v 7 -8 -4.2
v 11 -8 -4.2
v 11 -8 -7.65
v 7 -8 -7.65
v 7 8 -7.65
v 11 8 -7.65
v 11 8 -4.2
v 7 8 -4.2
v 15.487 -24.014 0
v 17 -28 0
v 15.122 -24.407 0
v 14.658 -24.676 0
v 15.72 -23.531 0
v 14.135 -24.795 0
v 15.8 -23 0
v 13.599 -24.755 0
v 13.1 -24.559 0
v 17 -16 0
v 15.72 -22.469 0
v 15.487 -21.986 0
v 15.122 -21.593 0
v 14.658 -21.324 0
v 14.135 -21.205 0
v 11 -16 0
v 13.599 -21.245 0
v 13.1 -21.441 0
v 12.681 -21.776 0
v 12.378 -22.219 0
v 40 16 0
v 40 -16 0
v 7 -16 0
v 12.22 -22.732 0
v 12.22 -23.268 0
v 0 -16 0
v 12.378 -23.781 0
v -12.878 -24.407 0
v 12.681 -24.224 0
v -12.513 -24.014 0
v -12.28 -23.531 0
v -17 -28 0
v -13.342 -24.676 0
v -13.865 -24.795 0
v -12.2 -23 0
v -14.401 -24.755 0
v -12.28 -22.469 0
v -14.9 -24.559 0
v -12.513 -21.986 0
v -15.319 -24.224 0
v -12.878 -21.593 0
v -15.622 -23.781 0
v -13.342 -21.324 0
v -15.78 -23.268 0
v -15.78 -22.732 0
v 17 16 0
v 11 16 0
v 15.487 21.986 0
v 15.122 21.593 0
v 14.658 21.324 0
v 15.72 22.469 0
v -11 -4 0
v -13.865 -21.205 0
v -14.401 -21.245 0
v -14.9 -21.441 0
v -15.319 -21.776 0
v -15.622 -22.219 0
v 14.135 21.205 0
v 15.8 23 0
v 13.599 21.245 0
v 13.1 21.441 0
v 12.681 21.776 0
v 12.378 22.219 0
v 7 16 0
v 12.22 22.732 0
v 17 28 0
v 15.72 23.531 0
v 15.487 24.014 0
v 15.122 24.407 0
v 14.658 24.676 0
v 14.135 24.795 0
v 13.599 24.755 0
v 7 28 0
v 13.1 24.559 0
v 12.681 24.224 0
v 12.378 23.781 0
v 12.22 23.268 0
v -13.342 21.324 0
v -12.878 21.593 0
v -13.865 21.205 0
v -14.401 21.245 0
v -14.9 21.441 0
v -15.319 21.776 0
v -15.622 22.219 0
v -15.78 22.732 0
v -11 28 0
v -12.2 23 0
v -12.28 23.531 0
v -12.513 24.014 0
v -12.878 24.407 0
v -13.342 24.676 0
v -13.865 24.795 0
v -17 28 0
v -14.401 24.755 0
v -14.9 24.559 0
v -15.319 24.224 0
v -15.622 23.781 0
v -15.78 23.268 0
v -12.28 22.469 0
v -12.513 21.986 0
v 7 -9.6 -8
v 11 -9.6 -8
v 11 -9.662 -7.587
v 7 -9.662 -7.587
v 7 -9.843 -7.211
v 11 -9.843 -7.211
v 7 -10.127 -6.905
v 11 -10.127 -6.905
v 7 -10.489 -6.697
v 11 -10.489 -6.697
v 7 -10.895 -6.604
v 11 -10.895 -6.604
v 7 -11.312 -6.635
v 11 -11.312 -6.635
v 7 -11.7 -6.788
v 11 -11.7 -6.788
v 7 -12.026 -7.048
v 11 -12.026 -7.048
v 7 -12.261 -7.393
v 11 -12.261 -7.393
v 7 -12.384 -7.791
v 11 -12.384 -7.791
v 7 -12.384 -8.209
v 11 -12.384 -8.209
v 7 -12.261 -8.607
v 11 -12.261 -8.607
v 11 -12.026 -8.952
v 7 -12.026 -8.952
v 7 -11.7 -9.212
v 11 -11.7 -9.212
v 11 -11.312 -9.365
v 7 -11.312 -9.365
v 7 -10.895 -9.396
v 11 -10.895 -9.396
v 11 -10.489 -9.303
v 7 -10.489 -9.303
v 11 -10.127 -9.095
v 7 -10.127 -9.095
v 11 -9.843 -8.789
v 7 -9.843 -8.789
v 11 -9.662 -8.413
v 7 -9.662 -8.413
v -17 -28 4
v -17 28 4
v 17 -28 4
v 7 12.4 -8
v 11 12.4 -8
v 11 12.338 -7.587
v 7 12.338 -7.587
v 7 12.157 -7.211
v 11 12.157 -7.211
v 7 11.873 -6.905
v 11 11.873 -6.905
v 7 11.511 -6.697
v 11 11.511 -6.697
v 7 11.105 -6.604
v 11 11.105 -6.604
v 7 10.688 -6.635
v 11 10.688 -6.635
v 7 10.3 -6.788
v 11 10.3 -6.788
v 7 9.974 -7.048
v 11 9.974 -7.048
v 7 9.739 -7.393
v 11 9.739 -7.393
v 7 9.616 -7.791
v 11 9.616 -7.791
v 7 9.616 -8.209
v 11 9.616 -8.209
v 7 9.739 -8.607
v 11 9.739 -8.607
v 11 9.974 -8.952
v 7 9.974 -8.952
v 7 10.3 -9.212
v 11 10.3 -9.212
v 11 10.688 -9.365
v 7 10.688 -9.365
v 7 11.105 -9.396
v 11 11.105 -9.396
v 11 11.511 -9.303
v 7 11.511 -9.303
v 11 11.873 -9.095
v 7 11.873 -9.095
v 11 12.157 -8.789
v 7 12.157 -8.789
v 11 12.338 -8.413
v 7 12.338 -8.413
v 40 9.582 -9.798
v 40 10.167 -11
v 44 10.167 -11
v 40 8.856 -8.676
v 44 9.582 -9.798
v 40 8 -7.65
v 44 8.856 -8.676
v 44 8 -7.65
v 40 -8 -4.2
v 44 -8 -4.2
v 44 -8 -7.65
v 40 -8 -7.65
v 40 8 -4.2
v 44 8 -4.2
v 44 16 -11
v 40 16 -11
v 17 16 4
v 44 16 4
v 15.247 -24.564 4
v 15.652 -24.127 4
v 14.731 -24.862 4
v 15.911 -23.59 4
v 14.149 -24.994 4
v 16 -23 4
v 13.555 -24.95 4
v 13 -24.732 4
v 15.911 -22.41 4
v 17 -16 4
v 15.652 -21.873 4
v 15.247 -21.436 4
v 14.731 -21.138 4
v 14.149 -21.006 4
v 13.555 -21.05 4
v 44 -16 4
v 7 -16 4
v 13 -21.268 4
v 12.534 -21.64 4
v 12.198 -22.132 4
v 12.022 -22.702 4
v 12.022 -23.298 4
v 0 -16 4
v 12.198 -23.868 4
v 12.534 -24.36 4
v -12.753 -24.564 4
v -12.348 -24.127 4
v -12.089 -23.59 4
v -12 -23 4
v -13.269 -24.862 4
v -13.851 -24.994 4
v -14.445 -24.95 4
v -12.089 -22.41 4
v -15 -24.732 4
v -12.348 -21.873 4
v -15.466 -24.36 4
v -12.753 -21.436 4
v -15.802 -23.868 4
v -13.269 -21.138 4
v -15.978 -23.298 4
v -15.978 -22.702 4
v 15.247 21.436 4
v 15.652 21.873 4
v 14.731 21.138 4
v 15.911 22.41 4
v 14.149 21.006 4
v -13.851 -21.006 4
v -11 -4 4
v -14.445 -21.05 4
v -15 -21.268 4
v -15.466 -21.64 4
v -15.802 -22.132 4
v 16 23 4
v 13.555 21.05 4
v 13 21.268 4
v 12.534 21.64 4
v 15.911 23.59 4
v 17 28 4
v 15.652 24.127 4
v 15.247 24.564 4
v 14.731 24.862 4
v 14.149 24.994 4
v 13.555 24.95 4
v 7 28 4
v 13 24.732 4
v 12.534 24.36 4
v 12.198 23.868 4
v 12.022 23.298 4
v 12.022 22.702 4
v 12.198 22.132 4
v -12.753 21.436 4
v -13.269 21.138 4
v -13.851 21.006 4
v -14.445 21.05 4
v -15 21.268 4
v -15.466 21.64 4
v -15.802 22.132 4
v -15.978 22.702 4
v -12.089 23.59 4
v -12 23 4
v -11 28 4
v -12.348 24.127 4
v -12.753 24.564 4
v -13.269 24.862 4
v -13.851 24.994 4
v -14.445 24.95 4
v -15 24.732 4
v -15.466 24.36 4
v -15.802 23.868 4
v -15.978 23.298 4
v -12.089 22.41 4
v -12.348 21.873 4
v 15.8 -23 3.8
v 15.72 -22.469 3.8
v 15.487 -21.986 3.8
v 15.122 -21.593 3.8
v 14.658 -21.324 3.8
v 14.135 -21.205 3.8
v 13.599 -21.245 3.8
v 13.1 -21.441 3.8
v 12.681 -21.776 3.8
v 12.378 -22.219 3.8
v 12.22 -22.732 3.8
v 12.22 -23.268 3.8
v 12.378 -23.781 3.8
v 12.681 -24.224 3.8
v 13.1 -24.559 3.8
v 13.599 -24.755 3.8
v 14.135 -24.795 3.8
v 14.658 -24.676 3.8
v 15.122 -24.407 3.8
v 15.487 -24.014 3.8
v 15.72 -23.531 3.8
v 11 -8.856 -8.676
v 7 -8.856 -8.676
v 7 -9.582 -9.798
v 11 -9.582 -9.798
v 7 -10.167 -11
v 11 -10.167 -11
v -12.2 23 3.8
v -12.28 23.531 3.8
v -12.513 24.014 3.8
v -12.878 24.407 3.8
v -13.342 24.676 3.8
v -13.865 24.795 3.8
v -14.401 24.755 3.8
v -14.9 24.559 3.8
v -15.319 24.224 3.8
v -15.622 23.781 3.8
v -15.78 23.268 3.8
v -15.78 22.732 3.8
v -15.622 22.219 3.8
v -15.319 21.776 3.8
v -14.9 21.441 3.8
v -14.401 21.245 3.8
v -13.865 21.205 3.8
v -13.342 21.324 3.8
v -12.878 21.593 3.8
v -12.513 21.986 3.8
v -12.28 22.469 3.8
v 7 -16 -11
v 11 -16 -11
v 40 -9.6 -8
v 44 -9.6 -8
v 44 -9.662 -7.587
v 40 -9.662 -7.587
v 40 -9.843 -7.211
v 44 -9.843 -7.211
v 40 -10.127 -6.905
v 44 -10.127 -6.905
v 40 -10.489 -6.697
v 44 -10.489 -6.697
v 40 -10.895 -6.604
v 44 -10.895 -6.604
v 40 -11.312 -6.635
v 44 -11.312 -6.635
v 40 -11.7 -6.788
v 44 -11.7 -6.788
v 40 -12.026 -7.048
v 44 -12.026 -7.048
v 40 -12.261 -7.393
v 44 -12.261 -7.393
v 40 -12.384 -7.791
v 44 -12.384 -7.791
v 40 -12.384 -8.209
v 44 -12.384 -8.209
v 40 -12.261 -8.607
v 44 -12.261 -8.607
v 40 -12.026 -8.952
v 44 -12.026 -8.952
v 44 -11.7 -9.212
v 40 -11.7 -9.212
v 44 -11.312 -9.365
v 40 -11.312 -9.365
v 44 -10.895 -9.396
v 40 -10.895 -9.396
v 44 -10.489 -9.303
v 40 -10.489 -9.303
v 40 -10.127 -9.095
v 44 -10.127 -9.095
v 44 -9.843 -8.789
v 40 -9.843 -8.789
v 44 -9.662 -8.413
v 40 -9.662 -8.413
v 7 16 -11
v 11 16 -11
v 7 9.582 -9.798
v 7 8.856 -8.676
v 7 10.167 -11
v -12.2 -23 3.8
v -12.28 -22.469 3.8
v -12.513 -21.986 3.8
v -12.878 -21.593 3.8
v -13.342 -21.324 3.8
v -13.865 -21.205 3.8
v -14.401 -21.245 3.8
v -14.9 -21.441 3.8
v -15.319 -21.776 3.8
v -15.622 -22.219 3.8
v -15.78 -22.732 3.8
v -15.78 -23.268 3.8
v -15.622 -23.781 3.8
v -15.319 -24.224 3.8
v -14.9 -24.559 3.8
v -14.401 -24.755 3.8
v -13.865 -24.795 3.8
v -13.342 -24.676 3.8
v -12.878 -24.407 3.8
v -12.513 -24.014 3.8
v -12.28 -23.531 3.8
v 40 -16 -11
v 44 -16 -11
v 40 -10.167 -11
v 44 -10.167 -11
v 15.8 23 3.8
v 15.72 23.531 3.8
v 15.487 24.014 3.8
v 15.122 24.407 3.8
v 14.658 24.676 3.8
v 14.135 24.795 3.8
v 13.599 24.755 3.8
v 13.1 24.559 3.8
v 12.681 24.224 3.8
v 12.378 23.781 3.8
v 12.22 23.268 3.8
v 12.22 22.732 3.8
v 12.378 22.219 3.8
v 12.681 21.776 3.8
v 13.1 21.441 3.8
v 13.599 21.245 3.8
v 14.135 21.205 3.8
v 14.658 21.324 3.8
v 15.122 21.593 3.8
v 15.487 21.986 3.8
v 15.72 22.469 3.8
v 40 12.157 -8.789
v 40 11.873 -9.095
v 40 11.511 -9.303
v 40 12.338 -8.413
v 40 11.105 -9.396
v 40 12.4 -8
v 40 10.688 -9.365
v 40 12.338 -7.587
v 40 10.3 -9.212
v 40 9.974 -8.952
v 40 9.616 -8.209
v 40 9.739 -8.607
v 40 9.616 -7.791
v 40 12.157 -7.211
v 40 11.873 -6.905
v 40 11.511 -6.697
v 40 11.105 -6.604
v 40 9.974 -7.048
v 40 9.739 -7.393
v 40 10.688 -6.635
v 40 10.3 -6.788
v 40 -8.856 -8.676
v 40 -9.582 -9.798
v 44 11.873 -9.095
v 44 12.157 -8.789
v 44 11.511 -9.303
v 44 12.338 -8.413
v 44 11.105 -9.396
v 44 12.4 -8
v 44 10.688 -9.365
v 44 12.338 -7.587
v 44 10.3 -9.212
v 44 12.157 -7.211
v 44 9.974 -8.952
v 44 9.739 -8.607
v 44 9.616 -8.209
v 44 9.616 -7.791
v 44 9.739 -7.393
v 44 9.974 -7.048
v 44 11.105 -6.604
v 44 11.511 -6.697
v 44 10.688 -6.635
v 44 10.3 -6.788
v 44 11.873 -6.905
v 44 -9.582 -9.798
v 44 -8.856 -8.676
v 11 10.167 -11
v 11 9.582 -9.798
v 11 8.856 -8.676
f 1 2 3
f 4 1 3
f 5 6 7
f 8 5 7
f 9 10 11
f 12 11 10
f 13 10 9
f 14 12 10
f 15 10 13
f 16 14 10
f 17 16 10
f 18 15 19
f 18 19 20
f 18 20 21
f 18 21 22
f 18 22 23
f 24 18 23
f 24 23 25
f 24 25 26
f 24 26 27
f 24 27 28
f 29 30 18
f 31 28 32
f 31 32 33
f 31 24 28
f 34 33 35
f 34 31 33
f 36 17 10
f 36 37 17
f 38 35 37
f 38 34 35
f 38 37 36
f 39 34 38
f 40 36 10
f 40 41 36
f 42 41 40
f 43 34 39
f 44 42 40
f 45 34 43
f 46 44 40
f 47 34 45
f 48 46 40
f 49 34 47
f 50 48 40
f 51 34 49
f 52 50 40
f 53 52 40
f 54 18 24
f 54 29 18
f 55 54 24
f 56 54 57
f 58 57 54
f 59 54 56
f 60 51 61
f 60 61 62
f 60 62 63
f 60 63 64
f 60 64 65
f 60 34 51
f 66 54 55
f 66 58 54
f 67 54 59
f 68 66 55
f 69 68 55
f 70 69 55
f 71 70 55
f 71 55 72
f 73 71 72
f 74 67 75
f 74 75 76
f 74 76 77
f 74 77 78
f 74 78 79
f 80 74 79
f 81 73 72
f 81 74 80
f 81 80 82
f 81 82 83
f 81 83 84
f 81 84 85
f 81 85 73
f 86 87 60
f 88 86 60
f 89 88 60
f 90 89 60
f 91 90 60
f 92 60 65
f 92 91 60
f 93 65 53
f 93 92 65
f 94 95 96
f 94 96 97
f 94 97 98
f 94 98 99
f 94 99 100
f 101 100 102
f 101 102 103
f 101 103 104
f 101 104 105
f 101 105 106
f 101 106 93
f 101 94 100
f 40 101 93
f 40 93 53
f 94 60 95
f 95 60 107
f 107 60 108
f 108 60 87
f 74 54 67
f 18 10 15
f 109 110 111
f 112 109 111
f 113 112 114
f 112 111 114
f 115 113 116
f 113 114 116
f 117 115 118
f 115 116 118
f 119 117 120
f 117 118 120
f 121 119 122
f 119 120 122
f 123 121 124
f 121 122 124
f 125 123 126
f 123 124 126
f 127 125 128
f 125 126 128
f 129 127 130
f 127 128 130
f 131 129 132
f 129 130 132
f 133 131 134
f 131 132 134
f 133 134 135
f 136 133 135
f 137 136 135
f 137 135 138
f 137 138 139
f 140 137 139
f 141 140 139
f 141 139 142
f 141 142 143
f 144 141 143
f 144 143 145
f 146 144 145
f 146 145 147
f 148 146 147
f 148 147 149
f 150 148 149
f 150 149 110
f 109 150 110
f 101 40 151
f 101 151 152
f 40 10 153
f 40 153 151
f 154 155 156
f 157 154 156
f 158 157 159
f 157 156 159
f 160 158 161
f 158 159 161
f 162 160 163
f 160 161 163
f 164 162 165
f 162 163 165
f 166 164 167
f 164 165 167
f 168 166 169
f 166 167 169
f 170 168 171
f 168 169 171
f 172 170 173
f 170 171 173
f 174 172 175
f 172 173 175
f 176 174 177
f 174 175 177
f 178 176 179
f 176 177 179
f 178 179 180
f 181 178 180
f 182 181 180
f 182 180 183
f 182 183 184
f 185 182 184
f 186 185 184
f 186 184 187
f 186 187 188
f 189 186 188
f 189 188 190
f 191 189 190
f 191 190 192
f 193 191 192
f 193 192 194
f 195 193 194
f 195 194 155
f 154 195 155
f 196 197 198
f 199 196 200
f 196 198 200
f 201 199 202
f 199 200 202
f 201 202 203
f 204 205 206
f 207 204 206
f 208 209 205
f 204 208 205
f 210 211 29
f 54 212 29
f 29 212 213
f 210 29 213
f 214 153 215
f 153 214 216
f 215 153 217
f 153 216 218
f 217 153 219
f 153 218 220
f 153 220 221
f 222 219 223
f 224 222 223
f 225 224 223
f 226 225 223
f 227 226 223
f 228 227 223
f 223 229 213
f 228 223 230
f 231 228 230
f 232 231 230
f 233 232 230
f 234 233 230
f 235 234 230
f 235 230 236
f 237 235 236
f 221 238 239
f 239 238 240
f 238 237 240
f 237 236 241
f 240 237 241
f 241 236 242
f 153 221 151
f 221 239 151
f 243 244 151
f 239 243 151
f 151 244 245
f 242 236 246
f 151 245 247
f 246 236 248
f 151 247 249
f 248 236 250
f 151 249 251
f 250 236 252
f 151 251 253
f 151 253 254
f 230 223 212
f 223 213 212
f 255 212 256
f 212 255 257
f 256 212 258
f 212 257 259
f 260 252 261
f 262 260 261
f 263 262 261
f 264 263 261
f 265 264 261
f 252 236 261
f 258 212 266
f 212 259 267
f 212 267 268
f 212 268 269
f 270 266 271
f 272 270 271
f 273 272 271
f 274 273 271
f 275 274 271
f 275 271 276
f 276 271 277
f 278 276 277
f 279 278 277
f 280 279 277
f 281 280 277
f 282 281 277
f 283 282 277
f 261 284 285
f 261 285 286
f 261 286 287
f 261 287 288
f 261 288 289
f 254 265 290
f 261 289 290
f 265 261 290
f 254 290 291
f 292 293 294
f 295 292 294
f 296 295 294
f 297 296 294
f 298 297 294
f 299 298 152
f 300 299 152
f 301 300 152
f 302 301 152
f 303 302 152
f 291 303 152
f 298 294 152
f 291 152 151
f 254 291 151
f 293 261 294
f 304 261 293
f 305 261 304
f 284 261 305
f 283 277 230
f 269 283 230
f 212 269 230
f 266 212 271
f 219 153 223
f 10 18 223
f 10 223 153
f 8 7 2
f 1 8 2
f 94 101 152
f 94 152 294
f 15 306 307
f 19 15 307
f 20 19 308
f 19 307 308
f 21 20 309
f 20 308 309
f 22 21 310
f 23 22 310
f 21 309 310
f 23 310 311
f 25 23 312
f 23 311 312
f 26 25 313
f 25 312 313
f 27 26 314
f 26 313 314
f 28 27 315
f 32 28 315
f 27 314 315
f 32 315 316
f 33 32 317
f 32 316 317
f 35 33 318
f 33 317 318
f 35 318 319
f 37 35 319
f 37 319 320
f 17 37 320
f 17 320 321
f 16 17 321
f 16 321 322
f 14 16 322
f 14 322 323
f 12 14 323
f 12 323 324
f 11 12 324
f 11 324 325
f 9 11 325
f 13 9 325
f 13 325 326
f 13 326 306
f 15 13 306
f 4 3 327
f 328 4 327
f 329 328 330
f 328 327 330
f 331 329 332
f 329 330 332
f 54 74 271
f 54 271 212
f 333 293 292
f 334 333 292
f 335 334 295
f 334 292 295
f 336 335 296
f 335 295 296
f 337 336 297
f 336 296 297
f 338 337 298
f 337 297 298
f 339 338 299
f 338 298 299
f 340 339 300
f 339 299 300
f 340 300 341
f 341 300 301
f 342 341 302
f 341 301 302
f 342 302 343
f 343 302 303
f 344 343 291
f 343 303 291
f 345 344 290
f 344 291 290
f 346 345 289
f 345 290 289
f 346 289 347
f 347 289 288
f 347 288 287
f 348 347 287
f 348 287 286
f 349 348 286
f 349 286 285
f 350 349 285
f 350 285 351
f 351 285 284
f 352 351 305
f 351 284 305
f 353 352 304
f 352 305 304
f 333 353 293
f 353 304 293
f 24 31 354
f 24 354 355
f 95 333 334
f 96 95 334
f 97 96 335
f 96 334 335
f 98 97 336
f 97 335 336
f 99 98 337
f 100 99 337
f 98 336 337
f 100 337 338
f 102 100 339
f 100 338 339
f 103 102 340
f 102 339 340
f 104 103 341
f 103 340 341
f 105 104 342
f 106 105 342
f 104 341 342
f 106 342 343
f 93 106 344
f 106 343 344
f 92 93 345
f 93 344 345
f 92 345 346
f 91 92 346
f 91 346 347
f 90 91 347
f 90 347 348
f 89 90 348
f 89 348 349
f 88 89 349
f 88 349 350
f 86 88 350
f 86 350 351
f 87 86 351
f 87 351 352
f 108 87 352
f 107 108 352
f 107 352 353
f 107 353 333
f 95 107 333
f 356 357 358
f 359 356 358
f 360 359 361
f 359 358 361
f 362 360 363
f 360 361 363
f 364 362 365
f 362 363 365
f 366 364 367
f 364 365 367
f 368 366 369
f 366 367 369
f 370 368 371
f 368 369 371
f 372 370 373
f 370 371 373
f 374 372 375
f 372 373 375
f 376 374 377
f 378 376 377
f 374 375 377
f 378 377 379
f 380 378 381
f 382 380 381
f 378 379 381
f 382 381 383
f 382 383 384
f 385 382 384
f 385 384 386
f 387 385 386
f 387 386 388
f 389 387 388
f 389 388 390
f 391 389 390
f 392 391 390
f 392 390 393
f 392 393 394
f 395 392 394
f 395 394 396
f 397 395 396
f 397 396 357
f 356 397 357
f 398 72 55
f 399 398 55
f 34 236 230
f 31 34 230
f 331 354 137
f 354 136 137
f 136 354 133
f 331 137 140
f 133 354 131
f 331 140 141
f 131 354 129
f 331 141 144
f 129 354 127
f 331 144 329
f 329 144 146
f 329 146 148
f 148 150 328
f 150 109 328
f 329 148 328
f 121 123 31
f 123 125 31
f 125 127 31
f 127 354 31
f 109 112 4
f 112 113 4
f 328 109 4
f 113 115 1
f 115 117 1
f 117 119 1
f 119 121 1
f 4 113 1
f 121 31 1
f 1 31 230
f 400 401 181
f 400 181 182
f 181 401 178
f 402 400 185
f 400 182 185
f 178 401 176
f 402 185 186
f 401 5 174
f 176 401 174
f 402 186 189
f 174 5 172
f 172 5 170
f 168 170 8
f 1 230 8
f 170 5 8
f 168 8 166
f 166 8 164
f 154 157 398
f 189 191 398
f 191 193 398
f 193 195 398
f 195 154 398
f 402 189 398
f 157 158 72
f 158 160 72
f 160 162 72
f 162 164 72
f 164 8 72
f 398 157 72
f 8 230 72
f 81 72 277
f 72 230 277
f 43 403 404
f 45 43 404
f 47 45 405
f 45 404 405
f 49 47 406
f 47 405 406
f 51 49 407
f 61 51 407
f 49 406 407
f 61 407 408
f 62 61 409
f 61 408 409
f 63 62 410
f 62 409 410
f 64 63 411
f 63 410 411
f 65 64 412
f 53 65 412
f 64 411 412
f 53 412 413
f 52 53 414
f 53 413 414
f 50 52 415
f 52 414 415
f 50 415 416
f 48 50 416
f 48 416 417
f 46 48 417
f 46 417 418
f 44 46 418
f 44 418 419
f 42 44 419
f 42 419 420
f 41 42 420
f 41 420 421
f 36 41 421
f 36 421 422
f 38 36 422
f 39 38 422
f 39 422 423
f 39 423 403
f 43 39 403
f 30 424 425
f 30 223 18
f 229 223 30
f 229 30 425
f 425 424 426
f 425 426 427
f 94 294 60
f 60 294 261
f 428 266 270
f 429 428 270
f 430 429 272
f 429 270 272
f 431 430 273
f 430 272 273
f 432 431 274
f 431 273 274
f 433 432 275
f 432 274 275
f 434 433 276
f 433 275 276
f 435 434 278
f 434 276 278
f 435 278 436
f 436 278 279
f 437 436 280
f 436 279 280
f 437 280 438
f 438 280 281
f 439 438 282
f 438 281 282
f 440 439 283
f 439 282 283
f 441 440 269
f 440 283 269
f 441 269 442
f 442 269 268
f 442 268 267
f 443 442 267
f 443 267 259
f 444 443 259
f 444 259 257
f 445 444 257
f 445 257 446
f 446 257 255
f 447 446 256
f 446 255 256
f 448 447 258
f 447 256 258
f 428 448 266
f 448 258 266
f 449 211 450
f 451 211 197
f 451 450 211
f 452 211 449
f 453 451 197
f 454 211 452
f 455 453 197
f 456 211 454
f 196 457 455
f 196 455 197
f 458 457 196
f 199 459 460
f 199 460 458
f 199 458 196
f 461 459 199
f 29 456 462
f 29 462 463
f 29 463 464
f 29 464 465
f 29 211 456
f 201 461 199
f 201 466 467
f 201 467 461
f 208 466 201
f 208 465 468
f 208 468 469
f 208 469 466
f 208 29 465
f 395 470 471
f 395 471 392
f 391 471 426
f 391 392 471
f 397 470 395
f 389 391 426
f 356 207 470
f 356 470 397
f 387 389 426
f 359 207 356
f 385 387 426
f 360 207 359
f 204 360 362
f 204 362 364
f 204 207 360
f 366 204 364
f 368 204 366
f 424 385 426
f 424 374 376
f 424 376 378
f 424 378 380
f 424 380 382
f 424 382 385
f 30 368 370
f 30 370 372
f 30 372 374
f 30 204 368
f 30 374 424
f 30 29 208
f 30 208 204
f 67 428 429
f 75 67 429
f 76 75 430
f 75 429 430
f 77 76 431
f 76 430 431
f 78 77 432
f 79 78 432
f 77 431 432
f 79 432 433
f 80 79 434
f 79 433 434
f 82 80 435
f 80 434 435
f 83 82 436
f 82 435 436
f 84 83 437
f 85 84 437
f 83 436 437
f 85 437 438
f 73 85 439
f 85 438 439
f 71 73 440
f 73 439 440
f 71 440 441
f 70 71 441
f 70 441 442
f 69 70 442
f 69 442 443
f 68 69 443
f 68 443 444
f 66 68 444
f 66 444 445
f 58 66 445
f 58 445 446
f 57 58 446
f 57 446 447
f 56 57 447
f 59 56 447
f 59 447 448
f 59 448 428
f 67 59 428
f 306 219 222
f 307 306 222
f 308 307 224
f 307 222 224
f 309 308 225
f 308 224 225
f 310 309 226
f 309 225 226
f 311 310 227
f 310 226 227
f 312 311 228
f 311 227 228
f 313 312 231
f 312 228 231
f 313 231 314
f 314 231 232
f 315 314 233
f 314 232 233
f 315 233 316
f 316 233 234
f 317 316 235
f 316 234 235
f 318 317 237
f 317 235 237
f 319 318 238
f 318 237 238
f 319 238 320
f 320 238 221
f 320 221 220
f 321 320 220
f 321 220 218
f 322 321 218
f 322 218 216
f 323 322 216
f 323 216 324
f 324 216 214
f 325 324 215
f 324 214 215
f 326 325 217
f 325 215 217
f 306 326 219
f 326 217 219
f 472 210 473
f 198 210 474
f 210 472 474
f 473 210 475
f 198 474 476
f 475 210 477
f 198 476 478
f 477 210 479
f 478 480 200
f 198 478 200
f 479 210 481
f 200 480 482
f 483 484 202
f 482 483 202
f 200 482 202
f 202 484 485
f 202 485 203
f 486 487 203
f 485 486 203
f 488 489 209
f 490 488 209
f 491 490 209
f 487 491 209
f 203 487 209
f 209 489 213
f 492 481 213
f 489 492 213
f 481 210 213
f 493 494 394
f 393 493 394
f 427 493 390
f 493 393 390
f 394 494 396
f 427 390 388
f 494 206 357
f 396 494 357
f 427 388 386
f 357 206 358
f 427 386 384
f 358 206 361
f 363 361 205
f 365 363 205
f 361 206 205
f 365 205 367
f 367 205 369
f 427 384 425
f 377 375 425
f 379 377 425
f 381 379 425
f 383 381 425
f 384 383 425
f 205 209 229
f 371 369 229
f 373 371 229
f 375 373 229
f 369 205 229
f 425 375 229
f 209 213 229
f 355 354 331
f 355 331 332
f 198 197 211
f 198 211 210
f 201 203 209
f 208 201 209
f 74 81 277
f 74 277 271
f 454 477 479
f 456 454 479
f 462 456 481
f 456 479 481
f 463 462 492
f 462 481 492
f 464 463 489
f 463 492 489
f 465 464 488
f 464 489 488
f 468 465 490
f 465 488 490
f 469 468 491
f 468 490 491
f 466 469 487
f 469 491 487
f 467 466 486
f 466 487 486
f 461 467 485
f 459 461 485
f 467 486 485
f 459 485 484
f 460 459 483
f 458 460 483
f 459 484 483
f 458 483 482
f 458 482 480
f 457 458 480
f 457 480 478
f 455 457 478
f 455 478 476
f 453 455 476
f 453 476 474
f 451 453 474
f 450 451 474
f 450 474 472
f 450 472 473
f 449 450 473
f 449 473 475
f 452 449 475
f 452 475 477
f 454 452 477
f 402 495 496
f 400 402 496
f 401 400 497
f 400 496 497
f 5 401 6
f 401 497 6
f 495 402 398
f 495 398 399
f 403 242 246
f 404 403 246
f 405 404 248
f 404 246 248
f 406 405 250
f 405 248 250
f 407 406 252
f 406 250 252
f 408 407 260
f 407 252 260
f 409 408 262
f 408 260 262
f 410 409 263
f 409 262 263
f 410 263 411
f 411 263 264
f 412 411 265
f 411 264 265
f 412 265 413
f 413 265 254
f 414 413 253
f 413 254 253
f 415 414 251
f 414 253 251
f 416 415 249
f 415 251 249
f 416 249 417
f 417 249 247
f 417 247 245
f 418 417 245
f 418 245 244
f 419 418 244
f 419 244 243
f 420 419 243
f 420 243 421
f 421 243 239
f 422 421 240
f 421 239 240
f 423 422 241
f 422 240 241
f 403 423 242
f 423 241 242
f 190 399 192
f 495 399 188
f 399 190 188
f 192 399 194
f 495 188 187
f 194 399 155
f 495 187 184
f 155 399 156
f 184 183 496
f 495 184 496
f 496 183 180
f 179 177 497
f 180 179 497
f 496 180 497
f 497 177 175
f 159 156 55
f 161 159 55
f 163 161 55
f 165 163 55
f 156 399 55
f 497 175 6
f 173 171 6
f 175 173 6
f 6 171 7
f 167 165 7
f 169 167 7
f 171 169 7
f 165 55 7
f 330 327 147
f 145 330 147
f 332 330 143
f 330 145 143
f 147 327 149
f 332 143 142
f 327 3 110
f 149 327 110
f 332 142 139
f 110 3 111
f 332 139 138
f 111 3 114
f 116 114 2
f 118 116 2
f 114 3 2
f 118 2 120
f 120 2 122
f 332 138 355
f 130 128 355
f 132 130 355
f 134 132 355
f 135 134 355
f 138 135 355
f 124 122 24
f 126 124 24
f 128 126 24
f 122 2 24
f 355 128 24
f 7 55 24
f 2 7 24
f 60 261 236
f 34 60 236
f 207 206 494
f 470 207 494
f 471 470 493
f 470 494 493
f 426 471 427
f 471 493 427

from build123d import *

# Parameters (mm, degrees)
PAD_DEPTH       = 4
POCKET_DEPTH    = 5
SKETCH005_R     = 1.8
POCKET001_DEPTH = 5
SKETCH004_W     = 4
SKETCH004_H     = 32
PAD001_DEPTH    = 11
SKETCH006_R     = 1.4
POCKET002_DEPTH = 100
POCKET003_DEPTH = 100
CHAMFER001_SIZE = 0.2


with BuildPart() as part:
    # Sketch → Pad (new body)
    with BuildSketch(Plane.XY):
        Polygon((-17, 28), (17, 28), (17, 16), (44, 16), (44, -16), (17, -16), (17, -28), (-17, -28), align=None)
    extrude(amount=PAD_DEPTH)

    # Sketch003 → Pocket (cut)
    with BuildSketch(Plane.XY.offset(4)):
        Polygon((-11, 28), (-11, -4), (0, -16), (7, -16), (7, 28), align=None)
    extrude(amount=-POCKET_DEPTH, mode=Mode.SUBTRACT)

    # Sketch005 (on Face4 of Pocket) → Pocket001 (cut)
    with BuildSketch(Plane.XY.offset(4)):
        with Locations((14, 23)):
            Circle(SKETCH005_R)
        with Locations((14, -23)):
            Circle(SKETCH005_R)
        with Locations((-14, -23)):
            Circle(SKETCH005_R)
        with Locations((-14, 23)):
            Circle(SKETCH005_R)
    extrude(amount=-POCKET001_DEPTH, mode=Mode.SUBTRACT)

    # Sketch004 (on Face2 of Pocket) → Pad001 (join)
    with BuildSketch(Plane(origin=(0, 0, 0), x_dir=(1, 0, 0), z_dir=(0, 0, -1))):
        with Locations((42, 0)):
            Rectangle(SKETCH004_W, SKETCH004_H)
        with Locations((9, 0)):
            Rectangle(SKETCH004_W, SKETCH004_H)
    extrude(amount=PAD001_DEPTH)

    # Sketch006 (on Face29 of Pad001) → Pocket002 (cut)
    with BuildSketch(Plane.YZ.offset(44)):
        with Locations((-11, -8)):
            Circle(SKETCH006_R)
        with Locations((11, -8)):
            Circle(SKETCH006_R)
    extrude(amount=-POCKET002_DEPTH, mode=Mode.SUBTRACT)

    # Sketch007 (on Face33 of Pocket002) → Pocket003 (cut)
    with BuildSketch(Plane.YZ.offset(44)):
        with BuildLine():
            Line((8, -7.650166), (8, -4.2))
            Line((8, -4.2), (-8, -4.2))
            Line((-8, -4.2), (-8, -7.650166))
            ThreePointArc((-8, -7.650166), (0, -26.2), (8, -7.650166))
        make_face()
    extrude(amount=-POCKET003_DEPTH, mode=Mode.SUBTRACT)

    # Chamfer001
    chamfer001_edges = [part.edges().sort_by_distance(p)[0] for p in [
        (-15.8, 23, 4),
        (-15.8, -23, 4),
        (12.2, -23, 4),
        (12.2, 23, 4),
    ]]
    chamfer(chamfer001_edges, length=CHAMFER001_SIZE)


solid = part.part
